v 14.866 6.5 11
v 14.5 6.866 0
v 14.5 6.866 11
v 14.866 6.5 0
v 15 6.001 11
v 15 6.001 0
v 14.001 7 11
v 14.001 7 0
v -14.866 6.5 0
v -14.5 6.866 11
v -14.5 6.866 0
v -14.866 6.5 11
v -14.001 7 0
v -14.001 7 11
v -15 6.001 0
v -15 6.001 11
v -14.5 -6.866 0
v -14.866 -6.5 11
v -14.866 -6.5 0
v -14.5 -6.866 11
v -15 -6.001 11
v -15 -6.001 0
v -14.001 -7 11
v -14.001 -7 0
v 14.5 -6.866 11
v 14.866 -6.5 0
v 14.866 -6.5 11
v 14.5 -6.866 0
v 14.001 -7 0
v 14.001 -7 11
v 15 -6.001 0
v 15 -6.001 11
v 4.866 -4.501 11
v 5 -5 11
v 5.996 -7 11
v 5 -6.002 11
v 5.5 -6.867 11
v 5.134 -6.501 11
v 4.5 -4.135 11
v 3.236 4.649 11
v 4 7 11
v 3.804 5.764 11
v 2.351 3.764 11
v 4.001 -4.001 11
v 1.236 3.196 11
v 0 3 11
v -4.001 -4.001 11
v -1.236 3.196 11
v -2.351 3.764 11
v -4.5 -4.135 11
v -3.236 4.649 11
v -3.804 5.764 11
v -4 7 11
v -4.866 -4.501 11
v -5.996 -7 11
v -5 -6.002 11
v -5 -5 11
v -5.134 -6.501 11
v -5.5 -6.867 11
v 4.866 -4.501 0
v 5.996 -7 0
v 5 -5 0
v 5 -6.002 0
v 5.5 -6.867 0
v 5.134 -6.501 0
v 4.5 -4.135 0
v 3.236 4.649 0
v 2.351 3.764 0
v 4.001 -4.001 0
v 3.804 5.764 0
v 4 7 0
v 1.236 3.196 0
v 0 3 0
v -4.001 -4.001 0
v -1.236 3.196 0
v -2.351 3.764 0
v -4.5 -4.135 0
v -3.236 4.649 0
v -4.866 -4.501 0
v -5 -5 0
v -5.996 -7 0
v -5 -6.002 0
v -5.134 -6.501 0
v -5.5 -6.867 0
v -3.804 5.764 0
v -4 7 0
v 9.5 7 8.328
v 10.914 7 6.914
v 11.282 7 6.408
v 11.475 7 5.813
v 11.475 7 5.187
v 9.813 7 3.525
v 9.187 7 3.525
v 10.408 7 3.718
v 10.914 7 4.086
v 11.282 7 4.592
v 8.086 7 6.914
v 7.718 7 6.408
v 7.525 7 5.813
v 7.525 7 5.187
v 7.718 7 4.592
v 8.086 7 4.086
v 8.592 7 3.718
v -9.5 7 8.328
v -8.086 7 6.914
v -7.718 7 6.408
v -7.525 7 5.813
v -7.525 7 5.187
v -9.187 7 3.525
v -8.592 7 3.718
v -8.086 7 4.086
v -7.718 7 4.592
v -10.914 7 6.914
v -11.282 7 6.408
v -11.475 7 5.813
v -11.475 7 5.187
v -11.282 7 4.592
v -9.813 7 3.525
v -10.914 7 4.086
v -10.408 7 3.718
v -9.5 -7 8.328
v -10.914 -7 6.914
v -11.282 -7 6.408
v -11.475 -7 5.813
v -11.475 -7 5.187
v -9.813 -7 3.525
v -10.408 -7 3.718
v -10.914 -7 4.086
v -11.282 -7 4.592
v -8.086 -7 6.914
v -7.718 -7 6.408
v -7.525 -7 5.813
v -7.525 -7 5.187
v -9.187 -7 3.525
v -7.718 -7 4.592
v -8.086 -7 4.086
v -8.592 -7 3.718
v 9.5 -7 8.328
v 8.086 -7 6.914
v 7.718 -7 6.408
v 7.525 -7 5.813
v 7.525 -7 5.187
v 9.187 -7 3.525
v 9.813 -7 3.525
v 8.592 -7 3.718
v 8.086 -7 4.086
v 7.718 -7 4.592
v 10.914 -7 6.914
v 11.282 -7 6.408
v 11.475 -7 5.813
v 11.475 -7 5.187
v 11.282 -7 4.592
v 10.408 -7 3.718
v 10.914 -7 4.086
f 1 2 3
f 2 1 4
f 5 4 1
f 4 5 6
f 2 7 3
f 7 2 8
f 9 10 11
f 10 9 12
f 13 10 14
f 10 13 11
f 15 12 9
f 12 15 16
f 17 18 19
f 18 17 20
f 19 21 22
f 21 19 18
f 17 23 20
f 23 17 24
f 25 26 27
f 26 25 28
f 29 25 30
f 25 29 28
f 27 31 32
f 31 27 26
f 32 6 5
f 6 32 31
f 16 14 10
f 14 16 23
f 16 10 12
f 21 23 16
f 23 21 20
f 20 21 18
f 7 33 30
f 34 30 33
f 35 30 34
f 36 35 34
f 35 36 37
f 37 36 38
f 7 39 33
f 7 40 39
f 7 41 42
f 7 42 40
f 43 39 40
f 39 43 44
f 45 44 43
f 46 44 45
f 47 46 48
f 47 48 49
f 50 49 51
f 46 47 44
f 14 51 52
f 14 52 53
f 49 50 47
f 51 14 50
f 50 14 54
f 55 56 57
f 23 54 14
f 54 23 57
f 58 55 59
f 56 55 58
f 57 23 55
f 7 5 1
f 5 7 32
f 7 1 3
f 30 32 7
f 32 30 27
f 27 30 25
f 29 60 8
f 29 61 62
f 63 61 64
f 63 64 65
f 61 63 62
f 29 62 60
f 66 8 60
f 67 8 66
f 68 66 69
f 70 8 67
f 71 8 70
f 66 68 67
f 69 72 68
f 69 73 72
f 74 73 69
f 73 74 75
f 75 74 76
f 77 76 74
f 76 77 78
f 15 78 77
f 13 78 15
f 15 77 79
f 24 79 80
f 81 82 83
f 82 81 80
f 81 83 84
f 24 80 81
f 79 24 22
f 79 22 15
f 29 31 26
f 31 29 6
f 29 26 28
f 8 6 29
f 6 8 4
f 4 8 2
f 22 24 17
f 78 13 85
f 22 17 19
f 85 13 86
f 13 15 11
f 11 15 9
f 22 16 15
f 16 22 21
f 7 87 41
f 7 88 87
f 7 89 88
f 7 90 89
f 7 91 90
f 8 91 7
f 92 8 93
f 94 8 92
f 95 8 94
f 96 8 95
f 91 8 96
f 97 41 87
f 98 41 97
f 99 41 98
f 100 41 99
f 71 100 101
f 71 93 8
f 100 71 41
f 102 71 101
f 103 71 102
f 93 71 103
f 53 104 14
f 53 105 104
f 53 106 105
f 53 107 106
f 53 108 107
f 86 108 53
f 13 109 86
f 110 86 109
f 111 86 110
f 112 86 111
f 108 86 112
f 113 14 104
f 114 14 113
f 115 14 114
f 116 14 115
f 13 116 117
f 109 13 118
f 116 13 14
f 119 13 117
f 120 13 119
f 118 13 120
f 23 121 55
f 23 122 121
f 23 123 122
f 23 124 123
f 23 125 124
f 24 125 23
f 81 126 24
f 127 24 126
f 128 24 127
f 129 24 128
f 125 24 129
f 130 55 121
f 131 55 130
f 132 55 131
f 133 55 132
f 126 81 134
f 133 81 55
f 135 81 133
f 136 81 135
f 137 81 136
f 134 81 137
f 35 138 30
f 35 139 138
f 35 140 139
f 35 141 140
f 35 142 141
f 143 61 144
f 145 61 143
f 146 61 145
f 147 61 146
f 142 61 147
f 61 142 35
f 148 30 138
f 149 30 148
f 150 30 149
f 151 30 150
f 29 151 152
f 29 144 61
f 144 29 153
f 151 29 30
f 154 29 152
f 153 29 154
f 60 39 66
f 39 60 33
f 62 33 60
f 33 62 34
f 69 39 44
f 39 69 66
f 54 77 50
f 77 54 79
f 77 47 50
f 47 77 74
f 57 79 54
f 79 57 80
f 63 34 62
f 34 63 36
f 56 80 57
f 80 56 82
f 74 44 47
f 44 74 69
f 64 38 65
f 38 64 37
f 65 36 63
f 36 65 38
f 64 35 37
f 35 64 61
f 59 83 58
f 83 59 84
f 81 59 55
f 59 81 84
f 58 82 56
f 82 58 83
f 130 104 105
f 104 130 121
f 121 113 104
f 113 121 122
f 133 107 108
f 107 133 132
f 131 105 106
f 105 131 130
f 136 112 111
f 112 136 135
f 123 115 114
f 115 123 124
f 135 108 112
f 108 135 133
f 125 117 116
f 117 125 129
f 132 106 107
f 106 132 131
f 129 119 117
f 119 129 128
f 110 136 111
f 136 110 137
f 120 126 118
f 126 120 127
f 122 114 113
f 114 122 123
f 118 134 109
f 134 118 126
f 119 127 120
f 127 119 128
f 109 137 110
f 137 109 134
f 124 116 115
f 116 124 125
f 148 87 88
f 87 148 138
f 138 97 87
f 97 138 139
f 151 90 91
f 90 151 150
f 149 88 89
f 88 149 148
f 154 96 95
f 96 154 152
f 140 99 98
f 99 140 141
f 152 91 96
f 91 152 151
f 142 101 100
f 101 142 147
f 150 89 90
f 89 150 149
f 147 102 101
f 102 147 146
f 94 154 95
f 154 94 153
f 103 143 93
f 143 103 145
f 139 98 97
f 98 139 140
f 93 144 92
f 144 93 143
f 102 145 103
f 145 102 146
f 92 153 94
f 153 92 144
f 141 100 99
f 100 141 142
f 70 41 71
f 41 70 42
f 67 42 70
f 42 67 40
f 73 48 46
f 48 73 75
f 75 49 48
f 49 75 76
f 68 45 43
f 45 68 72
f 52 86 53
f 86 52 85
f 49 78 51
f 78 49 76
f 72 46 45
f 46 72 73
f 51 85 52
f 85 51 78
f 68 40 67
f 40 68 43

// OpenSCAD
// x-bar-clamp-m4 remake in OpenSCAD
// by tonokip
// License GPL
// May 29, 2010

clamp_vM8=8;
hM4=4;

length=30;
width=14;
height=11;

$fn=20;

module xhole(diameter) rotate(a=90,v=[0,1,0]) zhole(diameter); 
module yhole(diameter) rotate(a=90,v=[1,0,0]) zhole(diameter); 
module zhole(diameter) cylinder(h=200,r=(diameter/2),center=true); 

module xteardrop(diameter,length) rotate(a=-90,v=[0,1,0]) rotate(a=-90,v=[0,0,1]) zteardrop(diameter,length);

module yteardrop(diameter,length) rotate(a=90,v=[1,0,0]) zteardrop(diameter,length);

module zteardrop(diameter,height)
{
	rotate(a=45, v=[0,0,1]) union()
	{
		translate([0,0,-height/2]) cube(size=[diameter/2,diameter/2,height],center=false);
		cylinder(r=diameter/2, h = height,center=true);
	}
}

translate([0,0,height/2])  //Start part at Z=0
difference()
{
	//Main block
	round_cube(length,width,height,radius=1,FN=3);

	//Indent
	translate([0,-width/2+3/2-0.001,0]) round_indent(10,3,11+1,radius=1,FN=3);
	//translate([0,-width/2,0]) cube([10,3*2,11+1],center=true); //Non rounded indent

	// Horizontal M4
	translate([-9.5,0,0]) yteardrop(hM4,100);
	translate([ 9.5,0,0]) yteardrop(hM4,100);

	// Clamp hole
	translate([0,width/2,0]) zhole(clamp_vM8);
}



module round_cube(length,width,height,radius,FN=10)
{
	difference()
	{
		cube([length,width,height],center=true);
		translate([ length/2, width/2,0]) round_corner(radius=radius,height=height+1,FN=FN);
		translate([-length/2, width/2,0]) zrot(90) round_corner(radius=radius,height=height+1,FN=FN);
		translate([-length/2,-width/2,0]) zrot(90*2) round_corner(radius=radius,height=height+1,FN=FN);
		translate([ length/2,-width/2,0]) zrot(90*3) round_corner(radius=radius,height=height+1,FN=FN);
	}
}

module round_indent(length,width,height,radius,FN=10)
{
	difference()
	{
		cube([length,width,height],center=true);
		translate([ length/2, width/2,0]) round_corner(radius=radius,height=height+1,FN=FN);
		translate([-length/2, width/2,0]) zrot(90) round_corner(radius=radius,height=height+1,FN=FN);
	}
	translate([ length/2,-width/2,0]) zrot(90*2) round_corner(radius=radius,height=height,FN=FN);
	translate([-length/2,-width/2,0]) zrot(90*3) round_corner(radius=radius,height=height,FN=FN);
}

module round_corner(radius,height,FN=10)
{
	if(FN > 0)
	{
		difference()
		{
			translate([-radius/2+0.001,-radius/2+0.001,0]) cube([radius,radius,height],center=true);
			translate([-radius,-radius,0]) cylinder(r=radius,h=height+1,center=true,$fn=FN*4);
		}
	}
}

module zrot(deg)
{
	rotate(a=deg,v=[0,0,1]) child(0);
}
